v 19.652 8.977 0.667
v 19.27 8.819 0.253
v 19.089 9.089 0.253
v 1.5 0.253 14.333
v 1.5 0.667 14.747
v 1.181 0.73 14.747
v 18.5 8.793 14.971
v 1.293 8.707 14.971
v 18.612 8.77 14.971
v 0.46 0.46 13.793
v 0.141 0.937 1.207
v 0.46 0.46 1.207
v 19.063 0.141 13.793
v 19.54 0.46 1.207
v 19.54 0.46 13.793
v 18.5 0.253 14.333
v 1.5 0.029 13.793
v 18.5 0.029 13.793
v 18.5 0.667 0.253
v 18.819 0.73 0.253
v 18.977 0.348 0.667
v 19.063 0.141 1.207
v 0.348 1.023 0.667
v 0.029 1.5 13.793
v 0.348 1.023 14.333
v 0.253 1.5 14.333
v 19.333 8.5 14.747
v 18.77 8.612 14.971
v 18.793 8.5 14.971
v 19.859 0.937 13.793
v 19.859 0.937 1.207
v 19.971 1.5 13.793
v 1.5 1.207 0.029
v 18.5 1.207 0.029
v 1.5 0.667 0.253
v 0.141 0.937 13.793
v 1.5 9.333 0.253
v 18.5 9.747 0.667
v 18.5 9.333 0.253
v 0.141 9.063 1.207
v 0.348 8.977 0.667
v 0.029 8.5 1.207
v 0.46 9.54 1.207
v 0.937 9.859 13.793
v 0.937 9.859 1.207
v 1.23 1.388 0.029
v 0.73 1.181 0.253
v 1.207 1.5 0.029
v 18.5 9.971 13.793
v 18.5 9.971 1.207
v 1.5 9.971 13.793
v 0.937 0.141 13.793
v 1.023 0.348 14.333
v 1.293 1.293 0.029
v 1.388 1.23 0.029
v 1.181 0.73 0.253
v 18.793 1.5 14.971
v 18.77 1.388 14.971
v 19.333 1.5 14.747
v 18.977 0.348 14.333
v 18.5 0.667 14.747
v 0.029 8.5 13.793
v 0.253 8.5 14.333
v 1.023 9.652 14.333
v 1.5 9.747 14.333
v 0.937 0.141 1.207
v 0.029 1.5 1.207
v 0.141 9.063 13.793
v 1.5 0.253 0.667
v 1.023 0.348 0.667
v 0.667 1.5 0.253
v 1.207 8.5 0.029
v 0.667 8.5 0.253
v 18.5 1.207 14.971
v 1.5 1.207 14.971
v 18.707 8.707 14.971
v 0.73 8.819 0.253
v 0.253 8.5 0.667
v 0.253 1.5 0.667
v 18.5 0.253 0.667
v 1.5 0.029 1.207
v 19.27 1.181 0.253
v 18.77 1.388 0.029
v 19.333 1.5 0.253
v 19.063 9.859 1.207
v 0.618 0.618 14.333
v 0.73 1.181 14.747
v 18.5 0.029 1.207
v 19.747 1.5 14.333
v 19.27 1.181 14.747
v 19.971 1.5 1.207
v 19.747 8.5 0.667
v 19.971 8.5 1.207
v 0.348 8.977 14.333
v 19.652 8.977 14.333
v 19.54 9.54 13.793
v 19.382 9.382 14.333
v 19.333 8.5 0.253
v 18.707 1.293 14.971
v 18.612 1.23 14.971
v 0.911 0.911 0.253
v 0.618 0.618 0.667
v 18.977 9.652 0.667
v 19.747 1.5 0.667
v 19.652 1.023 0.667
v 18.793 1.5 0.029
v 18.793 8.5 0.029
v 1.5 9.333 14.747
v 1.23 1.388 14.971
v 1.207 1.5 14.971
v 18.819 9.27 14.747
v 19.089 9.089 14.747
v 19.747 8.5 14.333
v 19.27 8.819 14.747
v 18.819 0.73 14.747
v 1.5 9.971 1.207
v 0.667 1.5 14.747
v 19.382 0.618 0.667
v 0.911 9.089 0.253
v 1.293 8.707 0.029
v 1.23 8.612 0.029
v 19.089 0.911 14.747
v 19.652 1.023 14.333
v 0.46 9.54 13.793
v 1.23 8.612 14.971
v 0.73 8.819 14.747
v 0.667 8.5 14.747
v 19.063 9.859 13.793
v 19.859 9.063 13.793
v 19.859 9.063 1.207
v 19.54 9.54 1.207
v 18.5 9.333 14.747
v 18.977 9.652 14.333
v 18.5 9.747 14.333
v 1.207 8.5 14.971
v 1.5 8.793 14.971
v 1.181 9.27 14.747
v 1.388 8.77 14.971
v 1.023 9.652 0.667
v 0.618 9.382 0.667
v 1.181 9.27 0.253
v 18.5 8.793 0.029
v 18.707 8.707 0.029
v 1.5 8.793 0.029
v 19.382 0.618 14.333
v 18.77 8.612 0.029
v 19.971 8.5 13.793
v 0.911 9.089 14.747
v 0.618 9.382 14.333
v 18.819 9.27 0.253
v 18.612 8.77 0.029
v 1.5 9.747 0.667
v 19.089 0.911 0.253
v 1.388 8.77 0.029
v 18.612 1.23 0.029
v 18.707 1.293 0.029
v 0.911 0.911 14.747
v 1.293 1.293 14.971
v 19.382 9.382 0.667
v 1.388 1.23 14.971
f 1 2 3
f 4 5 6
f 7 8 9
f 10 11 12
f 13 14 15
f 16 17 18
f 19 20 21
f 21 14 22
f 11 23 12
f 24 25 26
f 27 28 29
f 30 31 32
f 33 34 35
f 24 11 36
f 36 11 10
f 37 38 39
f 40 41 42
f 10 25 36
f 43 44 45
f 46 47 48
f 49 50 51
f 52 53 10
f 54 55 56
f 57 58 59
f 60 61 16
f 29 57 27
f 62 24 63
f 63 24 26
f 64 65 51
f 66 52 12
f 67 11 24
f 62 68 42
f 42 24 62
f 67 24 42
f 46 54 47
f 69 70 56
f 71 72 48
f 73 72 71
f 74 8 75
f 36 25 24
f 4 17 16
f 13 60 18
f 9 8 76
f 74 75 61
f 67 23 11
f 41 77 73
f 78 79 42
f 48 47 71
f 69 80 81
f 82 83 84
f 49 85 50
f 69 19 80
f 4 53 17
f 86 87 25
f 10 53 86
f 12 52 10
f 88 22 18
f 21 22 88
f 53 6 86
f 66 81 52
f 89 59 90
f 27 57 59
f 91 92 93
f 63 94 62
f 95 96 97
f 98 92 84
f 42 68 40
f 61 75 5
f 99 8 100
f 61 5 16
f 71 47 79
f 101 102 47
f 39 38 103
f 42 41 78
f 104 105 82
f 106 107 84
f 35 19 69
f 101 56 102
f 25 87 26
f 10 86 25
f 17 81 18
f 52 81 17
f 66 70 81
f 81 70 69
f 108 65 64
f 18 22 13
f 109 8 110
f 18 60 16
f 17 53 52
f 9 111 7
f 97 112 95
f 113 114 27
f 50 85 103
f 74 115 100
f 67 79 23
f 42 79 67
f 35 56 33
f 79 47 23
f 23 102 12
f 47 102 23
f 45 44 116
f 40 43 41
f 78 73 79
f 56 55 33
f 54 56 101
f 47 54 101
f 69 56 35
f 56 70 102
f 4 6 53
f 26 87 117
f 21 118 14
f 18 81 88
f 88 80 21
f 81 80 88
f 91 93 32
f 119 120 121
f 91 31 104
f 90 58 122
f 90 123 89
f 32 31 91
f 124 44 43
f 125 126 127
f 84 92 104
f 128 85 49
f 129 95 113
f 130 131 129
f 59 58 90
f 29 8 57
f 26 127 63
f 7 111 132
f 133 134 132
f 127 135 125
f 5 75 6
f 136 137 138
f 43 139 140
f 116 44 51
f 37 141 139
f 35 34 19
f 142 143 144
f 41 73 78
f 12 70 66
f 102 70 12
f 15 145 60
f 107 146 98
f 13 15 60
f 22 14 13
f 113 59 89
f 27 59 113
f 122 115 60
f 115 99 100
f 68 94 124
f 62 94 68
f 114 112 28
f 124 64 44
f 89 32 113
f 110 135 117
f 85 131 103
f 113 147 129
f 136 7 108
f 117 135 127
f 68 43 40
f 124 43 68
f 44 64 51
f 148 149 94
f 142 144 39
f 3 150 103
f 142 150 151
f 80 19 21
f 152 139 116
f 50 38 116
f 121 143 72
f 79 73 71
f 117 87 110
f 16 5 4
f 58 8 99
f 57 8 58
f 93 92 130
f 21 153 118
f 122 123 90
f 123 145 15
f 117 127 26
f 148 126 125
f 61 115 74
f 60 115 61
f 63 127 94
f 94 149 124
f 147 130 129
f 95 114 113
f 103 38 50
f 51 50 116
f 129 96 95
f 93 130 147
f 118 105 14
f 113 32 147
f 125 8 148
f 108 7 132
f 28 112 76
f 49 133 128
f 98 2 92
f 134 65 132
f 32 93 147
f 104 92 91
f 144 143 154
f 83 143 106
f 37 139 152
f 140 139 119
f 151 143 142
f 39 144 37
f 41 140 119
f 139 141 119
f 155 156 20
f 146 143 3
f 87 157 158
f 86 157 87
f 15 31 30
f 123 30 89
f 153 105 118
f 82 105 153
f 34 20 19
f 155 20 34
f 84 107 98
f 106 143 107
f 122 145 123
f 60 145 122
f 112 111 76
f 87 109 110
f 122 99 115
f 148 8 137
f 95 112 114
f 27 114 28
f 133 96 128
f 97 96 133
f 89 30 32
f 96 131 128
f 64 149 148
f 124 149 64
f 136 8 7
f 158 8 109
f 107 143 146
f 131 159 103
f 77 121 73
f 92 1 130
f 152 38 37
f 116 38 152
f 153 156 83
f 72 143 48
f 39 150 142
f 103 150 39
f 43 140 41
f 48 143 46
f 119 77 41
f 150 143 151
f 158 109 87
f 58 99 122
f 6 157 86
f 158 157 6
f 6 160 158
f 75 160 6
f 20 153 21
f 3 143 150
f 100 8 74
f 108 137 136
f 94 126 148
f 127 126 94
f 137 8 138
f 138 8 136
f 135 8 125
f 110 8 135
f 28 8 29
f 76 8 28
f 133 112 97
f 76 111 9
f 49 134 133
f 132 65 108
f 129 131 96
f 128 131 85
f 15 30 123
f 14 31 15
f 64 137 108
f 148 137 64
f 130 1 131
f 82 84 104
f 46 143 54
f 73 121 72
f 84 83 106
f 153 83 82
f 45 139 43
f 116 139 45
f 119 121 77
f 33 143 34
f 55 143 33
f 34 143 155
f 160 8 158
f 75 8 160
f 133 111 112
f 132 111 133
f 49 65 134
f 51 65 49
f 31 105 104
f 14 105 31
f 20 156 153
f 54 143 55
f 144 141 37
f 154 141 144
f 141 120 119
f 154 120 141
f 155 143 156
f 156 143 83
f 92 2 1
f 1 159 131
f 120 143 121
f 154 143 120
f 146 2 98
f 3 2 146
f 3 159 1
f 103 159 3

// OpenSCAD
$fn = 16;
r = 1.5;
width = 20;
depth = 10; 
height = 15;

round_cube(width, depth, height, r);
//%cube([width, depth, height]);

module round_cube(w, d, h, r) {
hull(){
	// bottom
	translate([r,r,r]) sphere(r);
	translate([r, d - r, r]) sphere(r);
	translate([w -r,r,r]) sphere(r);
	translate([w - r, d - r, r]) sphere(r);

	// top
	translate([r,r, h - r]) sphere(r);
	translate([r, d - r, h - r]) sphere(r);
	translate([w -r,r, h - r]) sphere(r);
	translate([w - r, d - r, h - r]) sphere(r);
}
}
